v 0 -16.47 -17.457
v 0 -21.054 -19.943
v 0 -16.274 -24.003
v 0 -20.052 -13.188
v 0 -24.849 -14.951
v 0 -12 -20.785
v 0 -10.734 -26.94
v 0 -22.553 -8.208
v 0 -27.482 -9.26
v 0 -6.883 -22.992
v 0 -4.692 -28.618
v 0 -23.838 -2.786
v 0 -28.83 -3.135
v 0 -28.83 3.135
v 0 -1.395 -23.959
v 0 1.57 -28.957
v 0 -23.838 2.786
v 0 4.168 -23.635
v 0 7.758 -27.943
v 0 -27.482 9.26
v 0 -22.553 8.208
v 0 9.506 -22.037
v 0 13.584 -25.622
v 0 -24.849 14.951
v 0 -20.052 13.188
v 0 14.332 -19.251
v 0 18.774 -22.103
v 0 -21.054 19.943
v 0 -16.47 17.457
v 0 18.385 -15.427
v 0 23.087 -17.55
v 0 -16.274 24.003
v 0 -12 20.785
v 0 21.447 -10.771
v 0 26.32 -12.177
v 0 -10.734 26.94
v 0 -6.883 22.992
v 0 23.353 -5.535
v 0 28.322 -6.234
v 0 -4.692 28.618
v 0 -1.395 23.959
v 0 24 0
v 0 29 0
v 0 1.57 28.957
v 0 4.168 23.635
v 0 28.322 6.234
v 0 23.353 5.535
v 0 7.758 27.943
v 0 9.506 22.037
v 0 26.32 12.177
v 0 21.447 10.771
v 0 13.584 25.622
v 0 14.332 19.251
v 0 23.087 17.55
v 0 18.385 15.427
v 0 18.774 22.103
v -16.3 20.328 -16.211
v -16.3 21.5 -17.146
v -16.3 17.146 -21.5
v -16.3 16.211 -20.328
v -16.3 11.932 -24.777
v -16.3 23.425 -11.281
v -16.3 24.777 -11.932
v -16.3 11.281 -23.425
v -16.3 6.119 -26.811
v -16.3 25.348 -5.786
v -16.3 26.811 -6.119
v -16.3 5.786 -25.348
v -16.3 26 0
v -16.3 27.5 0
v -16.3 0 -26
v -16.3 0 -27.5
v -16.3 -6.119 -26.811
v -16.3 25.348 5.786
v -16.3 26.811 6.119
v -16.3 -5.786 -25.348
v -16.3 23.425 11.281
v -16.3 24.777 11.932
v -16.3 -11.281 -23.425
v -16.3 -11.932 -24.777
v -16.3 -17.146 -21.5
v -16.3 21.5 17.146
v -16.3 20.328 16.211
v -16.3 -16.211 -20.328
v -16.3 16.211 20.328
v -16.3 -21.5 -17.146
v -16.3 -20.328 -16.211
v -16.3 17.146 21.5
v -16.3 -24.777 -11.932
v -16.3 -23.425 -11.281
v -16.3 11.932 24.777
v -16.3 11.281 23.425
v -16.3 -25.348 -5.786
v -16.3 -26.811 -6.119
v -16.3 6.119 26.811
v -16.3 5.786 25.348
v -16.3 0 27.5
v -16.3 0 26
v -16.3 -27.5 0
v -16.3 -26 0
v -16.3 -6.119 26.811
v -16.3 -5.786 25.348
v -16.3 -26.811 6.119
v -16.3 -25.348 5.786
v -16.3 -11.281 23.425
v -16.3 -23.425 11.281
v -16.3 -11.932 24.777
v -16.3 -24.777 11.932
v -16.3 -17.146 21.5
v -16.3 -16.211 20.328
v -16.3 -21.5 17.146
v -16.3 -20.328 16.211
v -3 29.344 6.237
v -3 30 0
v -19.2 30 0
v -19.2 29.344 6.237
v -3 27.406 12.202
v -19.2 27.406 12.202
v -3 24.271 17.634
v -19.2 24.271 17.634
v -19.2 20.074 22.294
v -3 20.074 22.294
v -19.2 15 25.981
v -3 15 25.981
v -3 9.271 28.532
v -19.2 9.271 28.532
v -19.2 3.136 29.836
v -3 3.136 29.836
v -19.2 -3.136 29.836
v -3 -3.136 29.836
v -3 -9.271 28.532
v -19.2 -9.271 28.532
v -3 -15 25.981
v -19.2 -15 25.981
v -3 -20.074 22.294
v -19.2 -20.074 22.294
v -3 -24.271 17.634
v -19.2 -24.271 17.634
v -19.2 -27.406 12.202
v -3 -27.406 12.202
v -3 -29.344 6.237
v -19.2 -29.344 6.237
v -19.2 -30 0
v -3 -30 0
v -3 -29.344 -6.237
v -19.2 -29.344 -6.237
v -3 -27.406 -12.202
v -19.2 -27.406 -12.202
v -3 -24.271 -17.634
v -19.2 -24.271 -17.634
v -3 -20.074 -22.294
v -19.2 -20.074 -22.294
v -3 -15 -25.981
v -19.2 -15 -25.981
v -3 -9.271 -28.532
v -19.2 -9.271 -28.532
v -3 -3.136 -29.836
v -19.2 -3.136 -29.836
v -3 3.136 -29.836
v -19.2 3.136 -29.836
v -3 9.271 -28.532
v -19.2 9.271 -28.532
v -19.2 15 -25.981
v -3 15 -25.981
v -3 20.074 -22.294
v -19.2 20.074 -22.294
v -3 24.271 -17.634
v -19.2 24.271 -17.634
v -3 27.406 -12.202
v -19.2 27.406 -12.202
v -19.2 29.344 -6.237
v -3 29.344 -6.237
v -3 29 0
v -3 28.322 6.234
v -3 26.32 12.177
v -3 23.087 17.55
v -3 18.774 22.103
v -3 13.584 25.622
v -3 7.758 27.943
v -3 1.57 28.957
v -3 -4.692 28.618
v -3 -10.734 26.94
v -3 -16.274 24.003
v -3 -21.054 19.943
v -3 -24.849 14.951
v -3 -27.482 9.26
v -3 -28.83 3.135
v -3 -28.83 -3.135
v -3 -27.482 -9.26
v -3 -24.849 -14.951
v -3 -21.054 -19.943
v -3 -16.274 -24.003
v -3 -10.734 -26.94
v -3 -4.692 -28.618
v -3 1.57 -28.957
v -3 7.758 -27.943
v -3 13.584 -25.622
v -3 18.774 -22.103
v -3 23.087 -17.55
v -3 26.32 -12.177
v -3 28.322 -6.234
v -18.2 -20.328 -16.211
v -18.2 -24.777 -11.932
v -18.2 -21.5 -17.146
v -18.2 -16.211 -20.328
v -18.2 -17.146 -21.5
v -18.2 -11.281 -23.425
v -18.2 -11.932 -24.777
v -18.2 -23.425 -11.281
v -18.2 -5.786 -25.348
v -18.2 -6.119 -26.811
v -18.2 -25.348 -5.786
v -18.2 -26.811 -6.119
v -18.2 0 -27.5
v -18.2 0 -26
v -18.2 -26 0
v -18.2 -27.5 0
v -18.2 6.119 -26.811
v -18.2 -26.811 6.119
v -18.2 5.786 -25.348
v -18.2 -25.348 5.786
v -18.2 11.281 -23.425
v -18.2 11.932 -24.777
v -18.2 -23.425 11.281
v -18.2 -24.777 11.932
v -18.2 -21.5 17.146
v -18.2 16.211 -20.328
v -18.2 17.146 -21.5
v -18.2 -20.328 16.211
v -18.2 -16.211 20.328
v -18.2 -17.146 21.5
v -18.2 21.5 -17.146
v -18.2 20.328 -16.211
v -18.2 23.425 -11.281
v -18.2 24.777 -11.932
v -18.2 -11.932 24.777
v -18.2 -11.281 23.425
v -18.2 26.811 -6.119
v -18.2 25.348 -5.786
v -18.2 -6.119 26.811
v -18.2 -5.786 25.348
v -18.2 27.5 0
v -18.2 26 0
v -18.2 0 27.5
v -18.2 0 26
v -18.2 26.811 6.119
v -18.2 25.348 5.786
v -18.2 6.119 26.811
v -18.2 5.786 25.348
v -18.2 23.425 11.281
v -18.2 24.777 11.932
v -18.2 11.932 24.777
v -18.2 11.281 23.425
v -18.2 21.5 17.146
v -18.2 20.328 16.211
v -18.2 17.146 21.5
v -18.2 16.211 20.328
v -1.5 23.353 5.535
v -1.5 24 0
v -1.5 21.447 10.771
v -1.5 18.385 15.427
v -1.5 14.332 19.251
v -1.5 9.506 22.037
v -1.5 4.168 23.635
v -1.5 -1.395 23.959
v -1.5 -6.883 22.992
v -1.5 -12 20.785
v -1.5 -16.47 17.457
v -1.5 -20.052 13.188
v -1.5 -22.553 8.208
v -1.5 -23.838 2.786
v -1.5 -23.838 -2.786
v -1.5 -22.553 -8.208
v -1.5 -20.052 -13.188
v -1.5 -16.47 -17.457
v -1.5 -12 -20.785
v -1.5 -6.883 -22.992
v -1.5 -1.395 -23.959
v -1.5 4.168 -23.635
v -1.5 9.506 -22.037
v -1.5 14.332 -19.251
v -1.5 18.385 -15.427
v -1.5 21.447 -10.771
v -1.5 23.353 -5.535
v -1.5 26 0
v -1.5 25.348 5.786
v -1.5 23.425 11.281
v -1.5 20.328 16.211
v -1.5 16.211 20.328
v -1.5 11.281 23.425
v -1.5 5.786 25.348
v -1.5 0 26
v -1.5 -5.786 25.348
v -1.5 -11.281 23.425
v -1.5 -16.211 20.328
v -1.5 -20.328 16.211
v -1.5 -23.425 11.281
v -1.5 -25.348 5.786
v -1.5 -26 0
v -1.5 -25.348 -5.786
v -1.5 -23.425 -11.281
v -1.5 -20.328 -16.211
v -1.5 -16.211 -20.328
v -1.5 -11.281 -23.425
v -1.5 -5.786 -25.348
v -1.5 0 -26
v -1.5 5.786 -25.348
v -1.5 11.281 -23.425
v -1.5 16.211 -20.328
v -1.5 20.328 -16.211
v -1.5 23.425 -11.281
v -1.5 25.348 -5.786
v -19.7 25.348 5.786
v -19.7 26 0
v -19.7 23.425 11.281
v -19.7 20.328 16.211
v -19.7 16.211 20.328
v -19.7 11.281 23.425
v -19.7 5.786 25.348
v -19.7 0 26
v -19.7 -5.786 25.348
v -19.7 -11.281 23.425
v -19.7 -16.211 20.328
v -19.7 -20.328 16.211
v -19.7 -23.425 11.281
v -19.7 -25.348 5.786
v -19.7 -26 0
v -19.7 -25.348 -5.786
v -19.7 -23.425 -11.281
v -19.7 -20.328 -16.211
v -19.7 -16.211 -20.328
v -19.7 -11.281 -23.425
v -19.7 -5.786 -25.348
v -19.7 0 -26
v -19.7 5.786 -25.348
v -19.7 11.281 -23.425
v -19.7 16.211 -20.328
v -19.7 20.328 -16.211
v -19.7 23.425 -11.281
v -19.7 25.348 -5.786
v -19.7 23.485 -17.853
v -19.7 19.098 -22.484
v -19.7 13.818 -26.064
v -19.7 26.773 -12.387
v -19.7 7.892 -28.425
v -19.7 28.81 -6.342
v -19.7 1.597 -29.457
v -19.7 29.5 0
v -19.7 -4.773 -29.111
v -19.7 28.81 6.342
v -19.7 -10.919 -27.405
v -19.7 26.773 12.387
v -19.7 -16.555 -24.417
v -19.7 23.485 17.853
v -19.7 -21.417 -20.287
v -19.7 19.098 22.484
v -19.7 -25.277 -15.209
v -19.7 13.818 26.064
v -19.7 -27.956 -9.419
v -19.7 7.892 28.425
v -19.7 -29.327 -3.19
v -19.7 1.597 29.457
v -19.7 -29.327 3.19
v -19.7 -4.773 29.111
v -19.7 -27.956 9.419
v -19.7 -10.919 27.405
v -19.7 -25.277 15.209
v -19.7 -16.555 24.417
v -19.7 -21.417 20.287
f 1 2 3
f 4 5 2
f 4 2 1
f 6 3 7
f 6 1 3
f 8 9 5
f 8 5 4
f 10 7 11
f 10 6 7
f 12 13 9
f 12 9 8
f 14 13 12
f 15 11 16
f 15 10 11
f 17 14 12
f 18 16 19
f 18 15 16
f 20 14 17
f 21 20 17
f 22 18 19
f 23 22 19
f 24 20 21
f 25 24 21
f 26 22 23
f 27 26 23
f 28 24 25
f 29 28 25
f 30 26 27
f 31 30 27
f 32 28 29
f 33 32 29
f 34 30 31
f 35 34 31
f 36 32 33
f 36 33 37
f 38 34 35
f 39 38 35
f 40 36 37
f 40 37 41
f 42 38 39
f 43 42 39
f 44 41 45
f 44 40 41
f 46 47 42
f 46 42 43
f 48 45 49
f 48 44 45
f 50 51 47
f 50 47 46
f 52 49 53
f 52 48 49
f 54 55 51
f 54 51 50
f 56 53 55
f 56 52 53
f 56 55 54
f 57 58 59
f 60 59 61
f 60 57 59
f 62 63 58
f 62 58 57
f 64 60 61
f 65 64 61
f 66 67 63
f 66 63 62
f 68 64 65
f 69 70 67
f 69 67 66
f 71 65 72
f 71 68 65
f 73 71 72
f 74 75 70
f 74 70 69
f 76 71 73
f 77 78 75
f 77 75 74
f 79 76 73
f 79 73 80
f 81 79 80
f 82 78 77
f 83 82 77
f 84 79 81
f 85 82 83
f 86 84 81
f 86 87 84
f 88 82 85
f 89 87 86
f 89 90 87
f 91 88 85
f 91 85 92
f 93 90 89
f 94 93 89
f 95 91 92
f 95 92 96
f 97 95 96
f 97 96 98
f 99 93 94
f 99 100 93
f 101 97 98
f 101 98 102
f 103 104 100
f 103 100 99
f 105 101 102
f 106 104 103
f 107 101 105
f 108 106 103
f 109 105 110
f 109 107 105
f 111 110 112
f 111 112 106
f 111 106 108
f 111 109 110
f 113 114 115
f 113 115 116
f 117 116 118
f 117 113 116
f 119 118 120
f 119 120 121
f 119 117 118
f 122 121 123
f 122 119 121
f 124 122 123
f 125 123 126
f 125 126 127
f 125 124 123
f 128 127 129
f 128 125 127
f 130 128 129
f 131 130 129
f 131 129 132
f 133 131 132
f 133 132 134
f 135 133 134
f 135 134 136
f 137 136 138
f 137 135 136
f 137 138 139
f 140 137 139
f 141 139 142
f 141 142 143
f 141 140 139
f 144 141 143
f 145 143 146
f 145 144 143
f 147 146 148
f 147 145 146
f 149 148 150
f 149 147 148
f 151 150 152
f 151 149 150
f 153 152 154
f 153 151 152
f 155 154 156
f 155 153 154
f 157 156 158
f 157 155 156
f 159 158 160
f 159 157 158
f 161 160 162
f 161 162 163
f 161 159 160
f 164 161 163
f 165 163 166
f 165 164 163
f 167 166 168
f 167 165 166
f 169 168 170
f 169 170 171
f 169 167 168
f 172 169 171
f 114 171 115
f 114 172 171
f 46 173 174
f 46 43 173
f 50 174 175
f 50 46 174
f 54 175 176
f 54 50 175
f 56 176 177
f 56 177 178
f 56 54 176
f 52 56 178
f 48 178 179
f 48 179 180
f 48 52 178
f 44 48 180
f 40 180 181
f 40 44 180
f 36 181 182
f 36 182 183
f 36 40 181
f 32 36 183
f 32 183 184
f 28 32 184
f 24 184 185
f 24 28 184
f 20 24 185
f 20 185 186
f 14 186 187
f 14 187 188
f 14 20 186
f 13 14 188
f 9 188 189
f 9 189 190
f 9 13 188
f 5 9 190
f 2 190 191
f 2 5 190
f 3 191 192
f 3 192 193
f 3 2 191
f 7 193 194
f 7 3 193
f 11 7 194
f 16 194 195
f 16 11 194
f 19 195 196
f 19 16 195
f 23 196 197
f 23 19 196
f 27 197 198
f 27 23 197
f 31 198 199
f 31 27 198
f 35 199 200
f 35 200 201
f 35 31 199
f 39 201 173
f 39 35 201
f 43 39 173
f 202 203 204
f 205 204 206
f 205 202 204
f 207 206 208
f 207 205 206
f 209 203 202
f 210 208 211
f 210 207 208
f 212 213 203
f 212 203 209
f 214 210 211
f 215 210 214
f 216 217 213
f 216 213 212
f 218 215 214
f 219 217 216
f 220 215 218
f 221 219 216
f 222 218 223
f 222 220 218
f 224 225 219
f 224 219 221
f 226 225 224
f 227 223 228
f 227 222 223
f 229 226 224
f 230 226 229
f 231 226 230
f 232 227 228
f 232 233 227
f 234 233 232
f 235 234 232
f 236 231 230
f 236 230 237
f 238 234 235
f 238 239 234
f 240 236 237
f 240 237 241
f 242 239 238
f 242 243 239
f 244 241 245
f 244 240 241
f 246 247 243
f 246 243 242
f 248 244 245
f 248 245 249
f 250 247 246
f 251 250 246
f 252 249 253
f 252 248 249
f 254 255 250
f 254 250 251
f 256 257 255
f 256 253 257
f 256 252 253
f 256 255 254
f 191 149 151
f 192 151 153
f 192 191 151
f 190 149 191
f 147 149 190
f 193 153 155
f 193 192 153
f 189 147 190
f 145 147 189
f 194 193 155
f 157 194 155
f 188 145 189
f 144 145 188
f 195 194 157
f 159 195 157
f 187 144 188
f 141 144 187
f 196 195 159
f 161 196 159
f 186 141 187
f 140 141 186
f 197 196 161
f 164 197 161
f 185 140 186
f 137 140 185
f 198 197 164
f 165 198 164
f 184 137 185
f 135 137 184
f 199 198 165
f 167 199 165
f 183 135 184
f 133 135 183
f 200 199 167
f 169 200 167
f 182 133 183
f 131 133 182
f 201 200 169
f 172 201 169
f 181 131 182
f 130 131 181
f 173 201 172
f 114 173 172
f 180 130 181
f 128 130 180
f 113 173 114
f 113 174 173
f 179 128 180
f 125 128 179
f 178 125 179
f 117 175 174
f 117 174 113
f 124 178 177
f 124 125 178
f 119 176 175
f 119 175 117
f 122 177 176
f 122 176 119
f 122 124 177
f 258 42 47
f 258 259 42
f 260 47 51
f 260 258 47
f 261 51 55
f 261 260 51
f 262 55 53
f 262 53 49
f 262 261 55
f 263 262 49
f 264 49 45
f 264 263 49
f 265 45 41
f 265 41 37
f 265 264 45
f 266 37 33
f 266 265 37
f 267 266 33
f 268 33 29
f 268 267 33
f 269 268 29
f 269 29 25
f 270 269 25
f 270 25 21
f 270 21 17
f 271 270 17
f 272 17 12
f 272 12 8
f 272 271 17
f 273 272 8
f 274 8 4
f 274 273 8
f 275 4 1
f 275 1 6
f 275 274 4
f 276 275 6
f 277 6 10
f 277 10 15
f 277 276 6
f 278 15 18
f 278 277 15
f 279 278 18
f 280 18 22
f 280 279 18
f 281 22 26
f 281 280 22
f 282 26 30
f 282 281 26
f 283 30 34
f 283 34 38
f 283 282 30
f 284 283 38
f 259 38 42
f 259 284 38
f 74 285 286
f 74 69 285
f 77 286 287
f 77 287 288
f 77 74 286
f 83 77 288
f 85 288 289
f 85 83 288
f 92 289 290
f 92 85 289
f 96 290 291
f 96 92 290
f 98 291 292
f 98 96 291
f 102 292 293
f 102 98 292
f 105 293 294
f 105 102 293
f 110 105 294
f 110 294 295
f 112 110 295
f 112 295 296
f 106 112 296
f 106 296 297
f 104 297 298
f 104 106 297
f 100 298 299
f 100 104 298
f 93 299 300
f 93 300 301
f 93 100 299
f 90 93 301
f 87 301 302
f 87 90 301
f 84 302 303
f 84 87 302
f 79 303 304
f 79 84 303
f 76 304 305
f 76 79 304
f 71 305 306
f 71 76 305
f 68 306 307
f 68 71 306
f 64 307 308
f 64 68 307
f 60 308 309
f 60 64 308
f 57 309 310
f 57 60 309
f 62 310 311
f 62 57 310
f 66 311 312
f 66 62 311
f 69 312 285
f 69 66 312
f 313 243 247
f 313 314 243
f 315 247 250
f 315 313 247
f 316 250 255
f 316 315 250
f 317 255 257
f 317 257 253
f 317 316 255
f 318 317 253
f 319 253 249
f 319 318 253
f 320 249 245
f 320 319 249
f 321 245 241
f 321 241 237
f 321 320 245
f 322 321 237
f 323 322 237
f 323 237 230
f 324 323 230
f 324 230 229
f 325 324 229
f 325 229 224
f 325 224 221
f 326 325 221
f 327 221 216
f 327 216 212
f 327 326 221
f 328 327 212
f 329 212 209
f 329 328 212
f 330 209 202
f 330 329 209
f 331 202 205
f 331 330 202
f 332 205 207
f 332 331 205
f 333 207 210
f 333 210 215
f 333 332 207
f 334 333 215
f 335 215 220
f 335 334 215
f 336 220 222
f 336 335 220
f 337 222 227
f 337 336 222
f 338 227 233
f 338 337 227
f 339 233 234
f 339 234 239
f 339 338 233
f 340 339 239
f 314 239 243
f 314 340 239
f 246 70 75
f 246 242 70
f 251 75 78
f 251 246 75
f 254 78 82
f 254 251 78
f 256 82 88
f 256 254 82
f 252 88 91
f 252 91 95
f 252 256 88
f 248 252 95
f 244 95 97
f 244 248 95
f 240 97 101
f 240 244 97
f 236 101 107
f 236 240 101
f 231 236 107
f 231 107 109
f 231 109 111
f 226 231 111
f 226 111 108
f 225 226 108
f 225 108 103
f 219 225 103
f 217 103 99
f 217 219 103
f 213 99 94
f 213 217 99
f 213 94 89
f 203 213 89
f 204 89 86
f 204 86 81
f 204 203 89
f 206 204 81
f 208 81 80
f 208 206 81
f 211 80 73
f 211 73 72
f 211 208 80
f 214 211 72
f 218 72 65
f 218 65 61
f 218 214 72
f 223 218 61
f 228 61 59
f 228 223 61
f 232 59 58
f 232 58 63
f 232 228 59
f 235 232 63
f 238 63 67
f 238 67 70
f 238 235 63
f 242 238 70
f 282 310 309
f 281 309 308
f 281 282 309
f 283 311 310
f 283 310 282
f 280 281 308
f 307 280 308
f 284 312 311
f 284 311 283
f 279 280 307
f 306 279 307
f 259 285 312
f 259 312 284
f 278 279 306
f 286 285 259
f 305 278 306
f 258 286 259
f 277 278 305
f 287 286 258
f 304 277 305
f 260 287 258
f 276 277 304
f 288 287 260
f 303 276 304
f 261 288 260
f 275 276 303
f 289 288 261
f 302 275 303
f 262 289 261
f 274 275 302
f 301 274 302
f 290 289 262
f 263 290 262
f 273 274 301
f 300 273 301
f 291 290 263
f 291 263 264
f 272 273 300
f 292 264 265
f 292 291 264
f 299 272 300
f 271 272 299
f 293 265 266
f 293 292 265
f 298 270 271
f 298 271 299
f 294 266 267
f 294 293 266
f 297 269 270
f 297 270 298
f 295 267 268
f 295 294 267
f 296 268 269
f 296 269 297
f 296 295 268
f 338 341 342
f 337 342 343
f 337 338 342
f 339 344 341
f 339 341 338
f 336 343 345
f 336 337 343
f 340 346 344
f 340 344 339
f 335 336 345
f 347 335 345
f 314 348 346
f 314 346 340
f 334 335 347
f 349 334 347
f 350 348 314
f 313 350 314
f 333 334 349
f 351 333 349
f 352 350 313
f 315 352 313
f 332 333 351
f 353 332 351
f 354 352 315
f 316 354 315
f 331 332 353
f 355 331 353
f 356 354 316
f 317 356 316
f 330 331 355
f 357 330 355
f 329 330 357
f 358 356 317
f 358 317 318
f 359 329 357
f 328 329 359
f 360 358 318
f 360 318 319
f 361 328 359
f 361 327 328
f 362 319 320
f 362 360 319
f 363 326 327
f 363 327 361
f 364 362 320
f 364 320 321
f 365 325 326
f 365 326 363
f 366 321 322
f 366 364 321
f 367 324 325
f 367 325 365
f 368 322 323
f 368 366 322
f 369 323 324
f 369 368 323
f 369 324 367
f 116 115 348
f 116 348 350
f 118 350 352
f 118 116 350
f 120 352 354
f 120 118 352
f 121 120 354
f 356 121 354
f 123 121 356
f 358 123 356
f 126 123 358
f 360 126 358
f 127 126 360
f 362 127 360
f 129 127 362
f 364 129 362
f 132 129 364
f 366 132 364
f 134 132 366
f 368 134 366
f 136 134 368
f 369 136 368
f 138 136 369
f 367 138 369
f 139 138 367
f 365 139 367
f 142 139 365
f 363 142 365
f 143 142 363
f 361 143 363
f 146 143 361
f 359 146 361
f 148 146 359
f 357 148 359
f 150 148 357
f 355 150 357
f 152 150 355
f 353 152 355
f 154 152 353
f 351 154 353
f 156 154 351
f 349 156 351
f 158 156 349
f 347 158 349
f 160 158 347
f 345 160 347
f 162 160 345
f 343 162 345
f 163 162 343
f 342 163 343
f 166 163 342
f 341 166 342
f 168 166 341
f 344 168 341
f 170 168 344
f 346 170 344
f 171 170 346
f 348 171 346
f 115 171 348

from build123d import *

# Parameters (mm, degrees)
CHAMFER_1_SIZE = 0.5


with BuildPart() as part:
    # Эскиз1 → Повернуть1 (revolve)
    with BuildSketch(Plane.XY):
        Polygon((0, 24), (-1.5, 24), (-1.5, 26), (-16.3, 26), (-16.3, 27.5), (-18.2, 27.5), (-18.2, 26), (-19.7, 26), (-19.7, 30), (-3, 30), (-3, 29), (0, 29), align=None)
    revolve(axis=Axis((-1000, 0, 0), (1, 0, 0)))

    # Фаска1
    chamfer_1_edges = [part.edges().sort_by_distance(p)[0] for p in [
        (-19.7, -30, 0),
    ]]
    chamfer(chamfer_1_edges, length=CHAMFER_1_SIZE)


solid = part.part
